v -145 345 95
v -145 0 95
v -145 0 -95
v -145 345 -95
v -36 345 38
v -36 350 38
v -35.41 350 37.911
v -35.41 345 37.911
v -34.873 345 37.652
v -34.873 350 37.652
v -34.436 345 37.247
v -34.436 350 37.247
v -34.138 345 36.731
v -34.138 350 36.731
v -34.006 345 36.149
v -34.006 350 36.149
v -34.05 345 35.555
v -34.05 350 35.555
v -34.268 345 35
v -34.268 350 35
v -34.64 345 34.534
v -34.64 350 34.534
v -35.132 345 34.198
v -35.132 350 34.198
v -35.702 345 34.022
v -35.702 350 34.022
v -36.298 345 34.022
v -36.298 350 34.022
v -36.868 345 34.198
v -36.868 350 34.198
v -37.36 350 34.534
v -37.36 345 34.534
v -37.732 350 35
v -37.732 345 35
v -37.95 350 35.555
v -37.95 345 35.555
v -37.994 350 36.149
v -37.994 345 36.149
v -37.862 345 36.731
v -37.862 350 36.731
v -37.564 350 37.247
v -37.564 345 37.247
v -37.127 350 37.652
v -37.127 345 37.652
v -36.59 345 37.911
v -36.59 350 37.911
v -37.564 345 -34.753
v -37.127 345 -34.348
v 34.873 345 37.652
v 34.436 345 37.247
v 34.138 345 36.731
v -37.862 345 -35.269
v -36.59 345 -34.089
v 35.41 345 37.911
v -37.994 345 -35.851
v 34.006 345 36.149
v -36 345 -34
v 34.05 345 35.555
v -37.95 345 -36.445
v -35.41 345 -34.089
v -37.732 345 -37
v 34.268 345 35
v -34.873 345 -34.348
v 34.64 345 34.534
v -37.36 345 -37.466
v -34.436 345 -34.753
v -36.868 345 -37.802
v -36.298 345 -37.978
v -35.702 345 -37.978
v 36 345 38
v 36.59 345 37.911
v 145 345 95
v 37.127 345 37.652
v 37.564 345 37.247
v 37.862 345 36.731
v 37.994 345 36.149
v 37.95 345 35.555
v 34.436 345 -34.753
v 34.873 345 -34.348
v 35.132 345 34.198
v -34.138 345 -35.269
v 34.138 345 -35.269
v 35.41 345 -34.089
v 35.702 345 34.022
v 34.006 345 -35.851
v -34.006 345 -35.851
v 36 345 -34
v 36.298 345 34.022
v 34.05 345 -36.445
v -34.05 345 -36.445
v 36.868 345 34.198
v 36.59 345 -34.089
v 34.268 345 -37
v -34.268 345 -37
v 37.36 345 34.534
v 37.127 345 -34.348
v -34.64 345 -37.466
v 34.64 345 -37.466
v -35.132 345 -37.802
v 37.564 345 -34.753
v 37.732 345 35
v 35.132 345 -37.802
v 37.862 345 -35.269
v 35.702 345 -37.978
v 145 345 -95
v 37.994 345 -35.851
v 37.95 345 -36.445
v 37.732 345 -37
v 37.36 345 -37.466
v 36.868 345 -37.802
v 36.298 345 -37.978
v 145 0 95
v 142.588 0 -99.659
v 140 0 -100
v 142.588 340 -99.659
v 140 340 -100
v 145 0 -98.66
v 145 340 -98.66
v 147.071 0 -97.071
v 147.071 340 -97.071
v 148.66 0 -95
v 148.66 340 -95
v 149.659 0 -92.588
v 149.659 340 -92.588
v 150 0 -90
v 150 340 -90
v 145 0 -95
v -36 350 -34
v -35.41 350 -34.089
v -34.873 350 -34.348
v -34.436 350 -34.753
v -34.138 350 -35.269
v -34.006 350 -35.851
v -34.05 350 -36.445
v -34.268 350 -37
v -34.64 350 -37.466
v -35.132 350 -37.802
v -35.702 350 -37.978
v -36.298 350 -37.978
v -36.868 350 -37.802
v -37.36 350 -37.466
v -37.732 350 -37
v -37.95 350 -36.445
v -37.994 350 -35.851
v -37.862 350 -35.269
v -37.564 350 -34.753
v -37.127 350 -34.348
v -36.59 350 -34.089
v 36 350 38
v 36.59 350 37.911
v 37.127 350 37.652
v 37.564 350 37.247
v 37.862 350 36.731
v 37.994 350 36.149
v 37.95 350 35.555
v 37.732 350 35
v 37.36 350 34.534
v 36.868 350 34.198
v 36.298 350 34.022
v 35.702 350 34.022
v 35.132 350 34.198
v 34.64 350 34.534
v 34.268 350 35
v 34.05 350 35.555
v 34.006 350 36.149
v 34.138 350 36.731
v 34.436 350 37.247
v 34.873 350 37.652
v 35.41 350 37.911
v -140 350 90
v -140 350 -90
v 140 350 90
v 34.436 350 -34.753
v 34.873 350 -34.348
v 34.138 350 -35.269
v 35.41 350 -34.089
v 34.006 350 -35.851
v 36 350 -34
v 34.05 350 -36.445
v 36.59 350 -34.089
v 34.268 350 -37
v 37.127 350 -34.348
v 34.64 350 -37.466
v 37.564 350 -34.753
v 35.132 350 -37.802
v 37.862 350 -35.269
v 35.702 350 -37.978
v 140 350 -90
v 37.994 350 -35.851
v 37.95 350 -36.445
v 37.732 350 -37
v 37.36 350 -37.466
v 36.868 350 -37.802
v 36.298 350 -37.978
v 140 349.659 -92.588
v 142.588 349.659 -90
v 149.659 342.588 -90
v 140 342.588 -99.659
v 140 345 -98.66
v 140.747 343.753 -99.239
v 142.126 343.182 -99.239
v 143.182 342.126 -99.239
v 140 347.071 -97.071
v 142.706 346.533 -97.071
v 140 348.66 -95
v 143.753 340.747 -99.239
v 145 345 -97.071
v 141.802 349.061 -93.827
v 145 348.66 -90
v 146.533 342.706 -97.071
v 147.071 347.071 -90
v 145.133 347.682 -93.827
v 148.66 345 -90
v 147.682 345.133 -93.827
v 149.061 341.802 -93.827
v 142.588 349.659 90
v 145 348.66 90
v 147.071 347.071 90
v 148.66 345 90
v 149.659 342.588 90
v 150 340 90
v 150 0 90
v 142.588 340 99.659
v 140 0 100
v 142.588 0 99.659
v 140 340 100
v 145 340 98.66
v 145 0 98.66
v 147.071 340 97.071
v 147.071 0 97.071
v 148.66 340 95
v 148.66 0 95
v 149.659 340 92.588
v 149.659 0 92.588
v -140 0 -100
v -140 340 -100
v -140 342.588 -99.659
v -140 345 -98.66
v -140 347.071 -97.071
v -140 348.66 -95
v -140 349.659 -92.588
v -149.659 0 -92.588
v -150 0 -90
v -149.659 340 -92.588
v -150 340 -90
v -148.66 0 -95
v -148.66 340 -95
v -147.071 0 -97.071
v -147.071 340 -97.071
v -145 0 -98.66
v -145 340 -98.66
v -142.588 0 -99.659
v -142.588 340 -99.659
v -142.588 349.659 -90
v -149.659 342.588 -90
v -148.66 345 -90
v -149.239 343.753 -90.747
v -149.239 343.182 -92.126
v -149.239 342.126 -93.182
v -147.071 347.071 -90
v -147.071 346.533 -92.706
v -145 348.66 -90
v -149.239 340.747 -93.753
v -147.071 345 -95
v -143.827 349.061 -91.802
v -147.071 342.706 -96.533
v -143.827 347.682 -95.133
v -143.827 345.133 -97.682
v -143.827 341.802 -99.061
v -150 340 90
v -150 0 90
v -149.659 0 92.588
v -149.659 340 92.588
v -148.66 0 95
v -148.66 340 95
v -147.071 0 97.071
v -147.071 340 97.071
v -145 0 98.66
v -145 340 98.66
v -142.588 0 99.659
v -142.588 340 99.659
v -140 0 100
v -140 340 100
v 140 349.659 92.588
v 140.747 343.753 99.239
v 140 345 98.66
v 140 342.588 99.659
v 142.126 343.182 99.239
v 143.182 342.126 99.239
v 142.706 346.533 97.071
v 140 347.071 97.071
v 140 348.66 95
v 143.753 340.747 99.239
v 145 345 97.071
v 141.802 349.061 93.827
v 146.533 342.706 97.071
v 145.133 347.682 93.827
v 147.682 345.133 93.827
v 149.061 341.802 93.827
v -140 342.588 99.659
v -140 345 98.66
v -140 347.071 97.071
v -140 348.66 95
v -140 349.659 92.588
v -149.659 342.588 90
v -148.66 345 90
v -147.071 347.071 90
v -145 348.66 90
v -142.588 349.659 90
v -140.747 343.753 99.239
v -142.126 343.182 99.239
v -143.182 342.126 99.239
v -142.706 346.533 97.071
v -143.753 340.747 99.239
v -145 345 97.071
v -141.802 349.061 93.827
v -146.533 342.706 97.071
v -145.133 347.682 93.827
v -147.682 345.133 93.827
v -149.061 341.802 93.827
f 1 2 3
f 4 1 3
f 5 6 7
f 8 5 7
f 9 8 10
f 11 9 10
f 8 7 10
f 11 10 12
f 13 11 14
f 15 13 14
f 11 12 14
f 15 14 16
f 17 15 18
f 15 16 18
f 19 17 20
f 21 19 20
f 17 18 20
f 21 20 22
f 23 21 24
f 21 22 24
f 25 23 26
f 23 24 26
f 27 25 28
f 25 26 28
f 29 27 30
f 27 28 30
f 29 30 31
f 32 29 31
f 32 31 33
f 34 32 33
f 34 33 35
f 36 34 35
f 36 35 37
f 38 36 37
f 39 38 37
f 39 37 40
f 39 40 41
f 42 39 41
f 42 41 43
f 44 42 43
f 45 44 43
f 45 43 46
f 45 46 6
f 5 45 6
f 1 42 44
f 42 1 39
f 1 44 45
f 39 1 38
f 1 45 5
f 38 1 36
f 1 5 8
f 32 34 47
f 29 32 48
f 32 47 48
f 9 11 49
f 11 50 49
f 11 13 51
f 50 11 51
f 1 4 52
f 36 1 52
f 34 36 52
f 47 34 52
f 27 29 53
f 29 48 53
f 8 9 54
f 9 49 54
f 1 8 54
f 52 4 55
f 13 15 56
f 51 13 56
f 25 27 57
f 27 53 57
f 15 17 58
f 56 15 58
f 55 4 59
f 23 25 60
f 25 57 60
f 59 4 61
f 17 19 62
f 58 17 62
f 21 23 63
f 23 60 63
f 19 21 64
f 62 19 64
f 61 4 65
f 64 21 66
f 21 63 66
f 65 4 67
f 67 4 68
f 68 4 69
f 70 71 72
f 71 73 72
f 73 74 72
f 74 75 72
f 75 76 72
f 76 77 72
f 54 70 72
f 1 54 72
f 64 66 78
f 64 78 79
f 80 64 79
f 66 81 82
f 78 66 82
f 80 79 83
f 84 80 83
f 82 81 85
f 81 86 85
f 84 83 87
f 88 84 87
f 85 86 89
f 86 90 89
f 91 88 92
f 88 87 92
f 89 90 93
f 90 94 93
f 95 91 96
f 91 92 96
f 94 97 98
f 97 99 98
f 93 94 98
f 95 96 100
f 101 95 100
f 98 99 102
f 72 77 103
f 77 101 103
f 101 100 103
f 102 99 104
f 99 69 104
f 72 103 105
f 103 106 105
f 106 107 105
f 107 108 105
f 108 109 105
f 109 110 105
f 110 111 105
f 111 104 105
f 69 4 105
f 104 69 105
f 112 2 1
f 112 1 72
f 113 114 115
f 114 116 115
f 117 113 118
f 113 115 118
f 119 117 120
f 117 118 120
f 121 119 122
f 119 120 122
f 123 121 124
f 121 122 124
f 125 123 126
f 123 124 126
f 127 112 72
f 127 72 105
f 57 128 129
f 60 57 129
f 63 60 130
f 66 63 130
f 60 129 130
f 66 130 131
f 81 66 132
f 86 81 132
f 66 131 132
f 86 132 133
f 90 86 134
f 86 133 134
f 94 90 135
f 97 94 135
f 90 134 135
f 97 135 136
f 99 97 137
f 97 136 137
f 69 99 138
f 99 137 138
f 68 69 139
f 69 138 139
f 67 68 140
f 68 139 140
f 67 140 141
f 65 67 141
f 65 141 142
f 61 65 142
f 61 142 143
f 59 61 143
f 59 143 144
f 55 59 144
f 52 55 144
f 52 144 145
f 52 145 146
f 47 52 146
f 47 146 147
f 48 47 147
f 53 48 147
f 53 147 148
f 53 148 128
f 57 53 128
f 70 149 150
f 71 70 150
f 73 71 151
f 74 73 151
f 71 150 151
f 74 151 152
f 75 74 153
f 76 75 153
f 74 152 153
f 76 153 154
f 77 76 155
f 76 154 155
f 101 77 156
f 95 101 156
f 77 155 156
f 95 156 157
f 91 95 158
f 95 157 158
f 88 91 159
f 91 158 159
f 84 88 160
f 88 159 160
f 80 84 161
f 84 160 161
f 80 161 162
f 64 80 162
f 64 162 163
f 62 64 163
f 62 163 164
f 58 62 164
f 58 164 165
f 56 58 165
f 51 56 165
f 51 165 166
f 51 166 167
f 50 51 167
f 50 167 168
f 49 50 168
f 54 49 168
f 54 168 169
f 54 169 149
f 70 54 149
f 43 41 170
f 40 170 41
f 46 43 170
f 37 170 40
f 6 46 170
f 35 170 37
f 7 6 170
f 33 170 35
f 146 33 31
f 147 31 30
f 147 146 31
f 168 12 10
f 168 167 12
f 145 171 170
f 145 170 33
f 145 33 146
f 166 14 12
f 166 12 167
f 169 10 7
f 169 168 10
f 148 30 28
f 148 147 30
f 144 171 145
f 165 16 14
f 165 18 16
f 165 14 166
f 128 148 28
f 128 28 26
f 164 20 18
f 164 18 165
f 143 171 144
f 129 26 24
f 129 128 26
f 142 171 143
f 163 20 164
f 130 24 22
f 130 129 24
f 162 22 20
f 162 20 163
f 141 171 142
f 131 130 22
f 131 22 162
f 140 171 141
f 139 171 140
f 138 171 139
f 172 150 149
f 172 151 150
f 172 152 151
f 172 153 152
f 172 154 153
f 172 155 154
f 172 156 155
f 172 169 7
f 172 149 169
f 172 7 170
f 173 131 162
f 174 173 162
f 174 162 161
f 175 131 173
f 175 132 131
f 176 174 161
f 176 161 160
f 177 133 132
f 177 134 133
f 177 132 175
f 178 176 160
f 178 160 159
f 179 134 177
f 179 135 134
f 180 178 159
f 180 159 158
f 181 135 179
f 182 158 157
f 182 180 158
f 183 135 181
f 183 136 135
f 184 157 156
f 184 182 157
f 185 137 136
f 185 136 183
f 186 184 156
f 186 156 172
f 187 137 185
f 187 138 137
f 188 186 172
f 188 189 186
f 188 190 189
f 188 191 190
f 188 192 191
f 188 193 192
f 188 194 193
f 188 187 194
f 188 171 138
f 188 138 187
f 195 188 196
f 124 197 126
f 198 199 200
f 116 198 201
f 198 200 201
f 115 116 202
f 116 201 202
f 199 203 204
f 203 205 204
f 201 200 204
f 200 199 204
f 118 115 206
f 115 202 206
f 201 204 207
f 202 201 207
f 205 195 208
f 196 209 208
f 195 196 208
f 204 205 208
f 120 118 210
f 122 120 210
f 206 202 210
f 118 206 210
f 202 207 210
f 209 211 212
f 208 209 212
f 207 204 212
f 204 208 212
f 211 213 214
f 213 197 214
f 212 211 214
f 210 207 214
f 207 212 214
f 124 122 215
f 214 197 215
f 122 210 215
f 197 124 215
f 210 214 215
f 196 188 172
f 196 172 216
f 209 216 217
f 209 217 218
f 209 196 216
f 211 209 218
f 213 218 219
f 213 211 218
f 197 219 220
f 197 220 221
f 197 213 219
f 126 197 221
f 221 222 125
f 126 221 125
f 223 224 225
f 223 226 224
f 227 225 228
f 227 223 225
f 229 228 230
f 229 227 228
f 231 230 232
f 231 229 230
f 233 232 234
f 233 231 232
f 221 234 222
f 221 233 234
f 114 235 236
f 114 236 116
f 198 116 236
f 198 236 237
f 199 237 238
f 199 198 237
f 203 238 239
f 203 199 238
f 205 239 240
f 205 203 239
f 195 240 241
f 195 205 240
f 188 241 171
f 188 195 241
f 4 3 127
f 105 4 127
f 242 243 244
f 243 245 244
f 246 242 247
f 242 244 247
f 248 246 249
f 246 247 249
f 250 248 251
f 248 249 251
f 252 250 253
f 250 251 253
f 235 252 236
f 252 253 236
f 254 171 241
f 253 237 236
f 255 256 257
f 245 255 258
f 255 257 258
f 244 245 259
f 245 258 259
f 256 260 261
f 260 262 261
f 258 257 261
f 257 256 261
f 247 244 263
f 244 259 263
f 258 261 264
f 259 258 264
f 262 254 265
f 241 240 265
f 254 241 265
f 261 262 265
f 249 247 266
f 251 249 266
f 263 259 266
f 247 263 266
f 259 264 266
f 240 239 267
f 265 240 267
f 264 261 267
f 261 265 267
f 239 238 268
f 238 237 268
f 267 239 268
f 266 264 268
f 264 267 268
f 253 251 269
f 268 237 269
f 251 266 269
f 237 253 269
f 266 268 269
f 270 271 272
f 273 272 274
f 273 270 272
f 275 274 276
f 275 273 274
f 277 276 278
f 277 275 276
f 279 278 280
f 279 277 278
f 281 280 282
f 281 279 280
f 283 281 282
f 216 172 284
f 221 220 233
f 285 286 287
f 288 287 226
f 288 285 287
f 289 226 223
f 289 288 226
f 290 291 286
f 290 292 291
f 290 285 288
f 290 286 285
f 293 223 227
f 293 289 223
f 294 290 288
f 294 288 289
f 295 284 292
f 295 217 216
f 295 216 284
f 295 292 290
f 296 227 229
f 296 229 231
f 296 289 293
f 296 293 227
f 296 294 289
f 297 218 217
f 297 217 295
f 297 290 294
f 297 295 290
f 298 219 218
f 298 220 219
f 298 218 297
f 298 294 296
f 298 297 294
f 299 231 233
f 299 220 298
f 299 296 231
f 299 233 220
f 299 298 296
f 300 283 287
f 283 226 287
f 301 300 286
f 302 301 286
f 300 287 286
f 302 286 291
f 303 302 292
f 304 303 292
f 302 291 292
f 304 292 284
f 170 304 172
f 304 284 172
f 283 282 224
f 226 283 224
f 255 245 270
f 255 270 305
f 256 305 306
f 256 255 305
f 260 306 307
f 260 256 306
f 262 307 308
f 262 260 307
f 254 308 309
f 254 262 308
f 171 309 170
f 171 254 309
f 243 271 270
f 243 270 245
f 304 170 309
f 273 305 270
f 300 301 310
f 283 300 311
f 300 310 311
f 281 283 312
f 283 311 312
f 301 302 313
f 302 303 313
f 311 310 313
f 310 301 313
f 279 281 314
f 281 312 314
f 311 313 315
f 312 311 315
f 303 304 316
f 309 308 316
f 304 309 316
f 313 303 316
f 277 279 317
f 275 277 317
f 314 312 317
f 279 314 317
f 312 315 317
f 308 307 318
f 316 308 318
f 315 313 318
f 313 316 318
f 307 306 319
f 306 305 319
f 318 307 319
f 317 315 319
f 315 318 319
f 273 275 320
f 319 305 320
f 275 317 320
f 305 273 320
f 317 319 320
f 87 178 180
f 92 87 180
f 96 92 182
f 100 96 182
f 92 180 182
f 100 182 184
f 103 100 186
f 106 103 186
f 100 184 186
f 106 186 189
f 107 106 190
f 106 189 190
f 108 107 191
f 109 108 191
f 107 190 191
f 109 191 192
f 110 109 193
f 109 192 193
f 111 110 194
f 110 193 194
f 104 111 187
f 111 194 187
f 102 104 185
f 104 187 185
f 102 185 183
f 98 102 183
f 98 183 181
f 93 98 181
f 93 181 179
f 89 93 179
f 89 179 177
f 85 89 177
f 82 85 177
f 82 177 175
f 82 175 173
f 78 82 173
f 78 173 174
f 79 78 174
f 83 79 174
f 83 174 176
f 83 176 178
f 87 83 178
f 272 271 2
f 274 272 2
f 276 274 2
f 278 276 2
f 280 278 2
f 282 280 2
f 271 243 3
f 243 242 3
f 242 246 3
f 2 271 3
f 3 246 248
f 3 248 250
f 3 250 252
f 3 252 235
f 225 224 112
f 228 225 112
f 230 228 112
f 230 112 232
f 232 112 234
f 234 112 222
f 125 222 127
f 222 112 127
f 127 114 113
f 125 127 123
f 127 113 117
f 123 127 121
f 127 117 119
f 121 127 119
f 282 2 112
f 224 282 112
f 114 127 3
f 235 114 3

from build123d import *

# Parameters (mm, degrees)
ESQUISSE1_W             = 300
ESQUISSE1_H             = 200
EXTRUSION1_DEPTH        = 350
COQUE2_T                = -5
ESQUISSE2_R             = 2
ENL_V_MAT_EXTRU_1_DEPTH = 394.700393701
CONG_1_R                = 10


with BuildPart() as part:
    # Esquisse1 → Extrusion1 (new body)
    with BuildSketch(Plane(origin=(0, 0, 0), x_dir=(1, 0, 0), z_dir=(0, 1, 0))):
        Rectangle(ESQUISSE1_W, ESQUISSE1_H)
    extrude(amount=EXTRUSION1_DEPTH)

    # Coque2
    coque2_openings = [part.faces().sort_by_distance(p)[0] for p in [
        (0, 0, 0),
    ]]
    offset(amount=COQUE2_T, openings=coque2_openings, kind=Kind.INTERSECTION)

    # Esquisse2 → Enlèv. mat.-Extru.1 (cut, through all)
    with BuildSketch(Plane(origin=(0, 350, 0), x_dir=(1, 0, 0), z_dir=(0, 1, 0))):
        with Locations(Location((-36, 36, 0), (0, 0, 270))):
            Circle(ESQUISSE2_R)
        with Locations(Location((36, 36, 0), (0, 0, 270))):
            Circle(ESQUISSE2_R)
        with Locations(Location((-36, -36, 0), (0, 0, 270))):
            Circle(ESQUISSE2_R)
        with Locations(Location((36, -36, 0), (0, 0, 270))):
            Circle(ESQUISSE2_R)
    extrude(amount=-ENL_V_MAT_EXTRU_1_DEPTH, mode=Mode.SUBTRACT)

    # Congé1
    cong_1_edges = [part.edges().sort_by_distance(p)[0] for p in [
        (150, 350, 0),
        (0, 350, -100),
        (-150, 350, 0),
        (0, 350, 100),
        (-150, 175, -100),
        (150, 175, -100),
        (150, 175, 100),
        (-150, 175, 100),
    ]]
    fillet(cong_1_edges, radius=CONG_1_R)


solid = part.part
